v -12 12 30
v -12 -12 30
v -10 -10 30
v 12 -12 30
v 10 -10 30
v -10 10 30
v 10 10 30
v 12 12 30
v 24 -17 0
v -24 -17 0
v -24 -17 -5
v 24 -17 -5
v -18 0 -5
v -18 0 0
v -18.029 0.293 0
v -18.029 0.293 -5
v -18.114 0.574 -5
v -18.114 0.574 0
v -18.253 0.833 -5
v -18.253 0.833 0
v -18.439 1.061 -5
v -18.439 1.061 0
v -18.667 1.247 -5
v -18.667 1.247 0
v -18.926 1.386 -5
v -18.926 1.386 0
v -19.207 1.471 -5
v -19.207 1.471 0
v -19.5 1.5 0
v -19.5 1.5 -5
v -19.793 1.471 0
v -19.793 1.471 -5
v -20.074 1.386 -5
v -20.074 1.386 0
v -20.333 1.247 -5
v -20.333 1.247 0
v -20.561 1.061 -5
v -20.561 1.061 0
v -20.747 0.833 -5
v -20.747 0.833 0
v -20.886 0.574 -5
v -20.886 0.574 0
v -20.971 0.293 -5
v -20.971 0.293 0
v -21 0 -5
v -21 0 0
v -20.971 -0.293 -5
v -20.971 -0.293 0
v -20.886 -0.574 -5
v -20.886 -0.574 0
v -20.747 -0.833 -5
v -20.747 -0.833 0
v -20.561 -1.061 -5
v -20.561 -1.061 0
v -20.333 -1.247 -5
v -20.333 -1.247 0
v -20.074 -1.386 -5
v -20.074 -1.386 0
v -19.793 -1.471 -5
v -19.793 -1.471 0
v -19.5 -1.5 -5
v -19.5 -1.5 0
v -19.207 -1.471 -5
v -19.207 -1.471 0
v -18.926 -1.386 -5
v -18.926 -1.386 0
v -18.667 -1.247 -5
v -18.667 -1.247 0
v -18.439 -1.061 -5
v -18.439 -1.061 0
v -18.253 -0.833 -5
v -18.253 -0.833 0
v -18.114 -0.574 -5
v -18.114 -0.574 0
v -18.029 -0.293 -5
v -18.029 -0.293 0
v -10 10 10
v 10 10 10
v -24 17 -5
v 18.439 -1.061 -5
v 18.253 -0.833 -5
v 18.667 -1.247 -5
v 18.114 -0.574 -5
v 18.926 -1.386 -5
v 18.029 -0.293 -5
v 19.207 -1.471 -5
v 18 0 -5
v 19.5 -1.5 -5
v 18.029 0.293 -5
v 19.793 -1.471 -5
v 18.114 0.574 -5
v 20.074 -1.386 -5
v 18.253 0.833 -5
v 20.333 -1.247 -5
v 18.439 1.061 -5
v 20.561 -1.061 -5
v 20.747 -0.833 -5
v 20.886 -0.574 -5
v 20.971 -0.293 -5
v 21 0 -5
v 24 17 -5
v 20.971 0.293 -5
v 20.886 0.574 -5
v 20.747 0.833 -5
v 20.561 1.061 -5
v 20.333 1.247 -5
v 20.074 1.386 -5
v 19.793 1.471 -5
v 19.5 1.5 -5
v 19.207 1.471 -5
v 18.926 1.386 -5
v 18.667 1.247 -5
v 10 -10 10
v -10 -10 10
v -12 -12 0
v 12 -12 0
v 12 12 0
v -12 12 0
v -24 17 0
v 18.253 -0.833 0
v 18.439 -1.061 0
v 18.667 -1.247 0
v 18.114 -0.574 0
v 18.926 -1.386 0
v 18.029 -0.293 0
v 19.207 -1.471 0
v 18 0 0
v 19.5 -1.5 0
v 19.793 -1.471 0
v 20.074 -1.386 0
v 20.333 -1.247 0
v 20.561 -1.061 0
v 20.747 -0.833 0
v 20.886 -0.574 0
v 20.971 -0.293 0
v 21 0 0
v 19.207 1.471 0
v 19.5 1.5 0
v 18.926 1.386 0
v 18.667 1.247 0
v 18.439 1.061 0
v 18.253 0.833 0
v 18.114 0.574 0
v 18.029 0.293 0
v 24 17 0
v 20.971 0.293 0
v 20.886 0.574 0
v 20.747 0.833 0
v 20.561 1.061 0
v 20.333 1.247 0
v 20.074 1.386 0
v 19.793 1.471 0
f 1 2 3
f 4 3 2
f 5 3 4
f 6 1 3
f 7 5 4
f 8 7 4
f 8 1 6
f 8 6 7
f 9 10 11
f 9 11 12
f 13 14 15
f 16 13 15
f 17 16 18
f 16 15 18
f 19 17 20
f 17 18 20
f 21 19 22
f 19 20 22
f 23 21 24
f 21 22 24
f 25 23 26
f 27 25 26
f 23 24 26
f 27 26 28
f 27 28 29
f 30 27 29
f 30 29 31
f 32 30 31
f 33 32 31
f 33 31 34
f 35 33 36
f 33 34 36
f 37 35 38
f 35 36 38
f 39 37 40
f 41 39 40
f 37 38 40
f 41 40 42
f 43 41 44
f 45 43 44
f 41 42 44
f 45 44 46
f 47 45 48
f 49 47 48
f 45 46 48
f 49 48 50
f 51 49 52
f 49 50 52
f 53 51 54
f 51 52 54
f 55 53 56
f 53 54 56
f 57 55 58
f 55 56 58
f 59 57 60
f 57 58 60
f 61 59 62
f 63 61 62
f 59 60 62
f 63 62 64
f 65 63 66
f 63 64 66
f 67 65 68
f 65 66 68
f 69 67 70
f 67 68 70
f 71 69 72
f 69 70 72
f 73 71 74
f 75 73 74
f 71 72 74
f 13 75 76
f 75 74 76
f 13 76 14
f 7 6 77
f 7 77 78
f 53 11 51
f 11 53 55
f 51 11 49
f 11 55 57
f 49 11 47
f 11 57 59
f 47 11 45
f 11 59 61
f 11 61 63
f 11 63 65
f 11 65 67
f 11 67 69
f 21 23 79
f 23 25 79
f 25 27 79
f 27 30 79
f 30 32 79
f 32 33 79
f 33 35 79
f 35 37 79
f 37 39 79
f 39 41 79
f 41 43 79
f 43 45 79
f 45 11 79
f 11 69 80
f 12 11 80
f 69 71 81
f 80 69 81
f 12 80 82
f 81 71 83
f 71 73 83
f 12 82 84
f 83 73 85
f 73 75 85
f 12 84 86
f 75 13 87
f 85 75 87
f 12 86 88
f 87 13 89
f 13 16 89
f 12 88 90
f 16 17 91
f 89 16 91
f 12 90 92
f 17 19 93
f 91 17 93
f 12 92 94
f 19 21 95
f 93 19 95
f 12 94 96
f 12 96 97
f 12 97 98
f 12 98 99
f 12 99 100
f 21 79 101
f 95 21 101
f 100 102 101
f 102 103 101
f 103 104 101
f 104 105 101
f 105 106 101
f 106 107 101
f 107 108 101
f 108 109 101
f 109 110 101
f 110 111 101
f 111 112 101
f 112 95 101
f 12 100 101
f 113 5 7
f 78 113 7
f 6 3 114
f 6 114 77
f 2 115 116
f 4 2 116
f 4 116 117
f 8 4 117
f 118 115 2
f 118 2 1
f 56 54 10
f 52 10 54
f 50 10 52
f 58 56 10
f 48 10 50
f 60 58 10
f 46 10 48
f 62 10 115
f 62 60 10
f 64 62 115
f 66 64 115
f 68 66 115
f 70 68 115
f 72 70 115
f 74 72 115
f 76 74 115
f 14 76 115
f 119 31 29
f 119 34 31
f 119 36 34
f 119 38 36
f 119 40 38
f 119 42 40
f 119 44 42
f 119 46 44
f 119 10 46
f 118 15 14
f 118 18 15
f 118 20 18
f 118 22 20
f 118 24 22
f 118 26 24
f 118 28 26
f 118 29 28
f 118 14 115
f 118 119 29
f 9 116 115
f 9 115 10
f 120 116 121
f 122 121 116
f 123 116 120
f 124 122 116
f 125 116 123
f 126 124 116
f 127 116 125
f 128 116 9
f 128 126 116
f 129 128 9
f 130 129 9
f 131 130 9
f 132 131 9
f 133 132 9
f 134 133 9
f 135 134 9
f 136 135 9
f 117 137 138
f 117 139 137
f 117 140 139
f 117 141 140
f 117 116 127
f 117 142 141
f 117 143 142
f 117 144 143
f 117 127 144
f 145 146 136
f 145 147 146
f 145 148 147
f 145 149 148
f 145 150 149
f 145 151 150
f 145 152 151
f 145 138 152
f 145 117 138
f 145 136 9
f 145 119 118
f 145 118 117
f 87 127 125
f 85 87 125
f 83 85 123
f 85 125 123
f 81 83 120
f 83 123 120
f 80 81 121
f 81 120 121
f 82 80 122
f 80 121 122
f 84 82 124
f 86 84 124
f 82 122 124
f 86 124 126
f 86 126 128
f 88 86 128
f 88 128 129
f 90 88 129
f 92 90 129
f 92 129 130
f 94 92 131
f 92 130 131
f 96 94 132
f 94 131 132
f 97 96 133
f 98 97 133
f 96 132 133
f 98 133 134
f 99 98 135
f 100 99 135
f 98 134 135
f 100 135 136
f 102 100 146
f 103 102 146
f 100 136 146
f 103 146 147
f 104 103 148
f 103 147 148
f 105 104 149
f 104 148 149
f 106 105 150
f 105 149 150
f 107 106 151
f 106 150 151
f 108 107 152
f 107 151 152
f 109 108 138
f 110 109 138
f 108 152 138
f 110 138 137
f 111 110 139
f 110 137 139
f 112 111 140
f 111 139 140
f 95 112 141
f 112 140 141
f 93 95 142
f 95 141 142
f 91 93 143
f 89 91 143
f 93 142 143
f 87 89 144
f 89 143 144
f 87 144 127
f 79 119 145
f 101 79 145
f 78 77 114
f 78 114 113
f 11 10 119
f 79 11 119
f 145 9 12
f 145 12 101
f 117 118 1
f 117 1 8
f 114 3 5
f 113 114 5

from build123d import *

# Parameters (mm, degrees)
F0_W     = 48
F0_H     = 34
F1_DEPTH = 5
F2_R     = 1.5
F3_DEPTH = 5
F4_W     = 24
F4_H     = 24
F5_DEPTH = 30
F6_W     = 20
F6_H     = 20
F7_DEPTH = 20


with BuildPart() as f1:
    # F0 (on Top) → F1 (new body)
    with BuildSketch(Plane.XY):
        Rectangle(F0_W, F0_H)
    extrude(amount=-F1_DEPTH)

    # F2 (on face) → F3 (cut)
    with BuildSketch(Plane.XY):
        with Locations((-19.5, 0)):
            Circle(F2_R)
        with BuildLine():
            ThreePointArc((21, 0), (19.5, 1.5), (18, 0))
            ThreePointArc((18, 0), (19.5, -1.5), (21, 0))
        make_face()
    extrude(amount=-F3_DEPTH, mode=Mode.SUBTRACT)

    # F4 (on face) → F5 (join)
    with BuildSketch(Plane.XY):
        Rectangle(F4_W, F4_H)
    extrude(amount=F5_DEPTH)

    # F6 (on face) → F7 (cut)
    with BuildSketch(Plane.XY.offset(30)):
        Rectangle(F6_W, F6_H)
    extrude(amount=-F7_DEPTH, mode=Mode.SUBTRACT)


solid = f1.part
